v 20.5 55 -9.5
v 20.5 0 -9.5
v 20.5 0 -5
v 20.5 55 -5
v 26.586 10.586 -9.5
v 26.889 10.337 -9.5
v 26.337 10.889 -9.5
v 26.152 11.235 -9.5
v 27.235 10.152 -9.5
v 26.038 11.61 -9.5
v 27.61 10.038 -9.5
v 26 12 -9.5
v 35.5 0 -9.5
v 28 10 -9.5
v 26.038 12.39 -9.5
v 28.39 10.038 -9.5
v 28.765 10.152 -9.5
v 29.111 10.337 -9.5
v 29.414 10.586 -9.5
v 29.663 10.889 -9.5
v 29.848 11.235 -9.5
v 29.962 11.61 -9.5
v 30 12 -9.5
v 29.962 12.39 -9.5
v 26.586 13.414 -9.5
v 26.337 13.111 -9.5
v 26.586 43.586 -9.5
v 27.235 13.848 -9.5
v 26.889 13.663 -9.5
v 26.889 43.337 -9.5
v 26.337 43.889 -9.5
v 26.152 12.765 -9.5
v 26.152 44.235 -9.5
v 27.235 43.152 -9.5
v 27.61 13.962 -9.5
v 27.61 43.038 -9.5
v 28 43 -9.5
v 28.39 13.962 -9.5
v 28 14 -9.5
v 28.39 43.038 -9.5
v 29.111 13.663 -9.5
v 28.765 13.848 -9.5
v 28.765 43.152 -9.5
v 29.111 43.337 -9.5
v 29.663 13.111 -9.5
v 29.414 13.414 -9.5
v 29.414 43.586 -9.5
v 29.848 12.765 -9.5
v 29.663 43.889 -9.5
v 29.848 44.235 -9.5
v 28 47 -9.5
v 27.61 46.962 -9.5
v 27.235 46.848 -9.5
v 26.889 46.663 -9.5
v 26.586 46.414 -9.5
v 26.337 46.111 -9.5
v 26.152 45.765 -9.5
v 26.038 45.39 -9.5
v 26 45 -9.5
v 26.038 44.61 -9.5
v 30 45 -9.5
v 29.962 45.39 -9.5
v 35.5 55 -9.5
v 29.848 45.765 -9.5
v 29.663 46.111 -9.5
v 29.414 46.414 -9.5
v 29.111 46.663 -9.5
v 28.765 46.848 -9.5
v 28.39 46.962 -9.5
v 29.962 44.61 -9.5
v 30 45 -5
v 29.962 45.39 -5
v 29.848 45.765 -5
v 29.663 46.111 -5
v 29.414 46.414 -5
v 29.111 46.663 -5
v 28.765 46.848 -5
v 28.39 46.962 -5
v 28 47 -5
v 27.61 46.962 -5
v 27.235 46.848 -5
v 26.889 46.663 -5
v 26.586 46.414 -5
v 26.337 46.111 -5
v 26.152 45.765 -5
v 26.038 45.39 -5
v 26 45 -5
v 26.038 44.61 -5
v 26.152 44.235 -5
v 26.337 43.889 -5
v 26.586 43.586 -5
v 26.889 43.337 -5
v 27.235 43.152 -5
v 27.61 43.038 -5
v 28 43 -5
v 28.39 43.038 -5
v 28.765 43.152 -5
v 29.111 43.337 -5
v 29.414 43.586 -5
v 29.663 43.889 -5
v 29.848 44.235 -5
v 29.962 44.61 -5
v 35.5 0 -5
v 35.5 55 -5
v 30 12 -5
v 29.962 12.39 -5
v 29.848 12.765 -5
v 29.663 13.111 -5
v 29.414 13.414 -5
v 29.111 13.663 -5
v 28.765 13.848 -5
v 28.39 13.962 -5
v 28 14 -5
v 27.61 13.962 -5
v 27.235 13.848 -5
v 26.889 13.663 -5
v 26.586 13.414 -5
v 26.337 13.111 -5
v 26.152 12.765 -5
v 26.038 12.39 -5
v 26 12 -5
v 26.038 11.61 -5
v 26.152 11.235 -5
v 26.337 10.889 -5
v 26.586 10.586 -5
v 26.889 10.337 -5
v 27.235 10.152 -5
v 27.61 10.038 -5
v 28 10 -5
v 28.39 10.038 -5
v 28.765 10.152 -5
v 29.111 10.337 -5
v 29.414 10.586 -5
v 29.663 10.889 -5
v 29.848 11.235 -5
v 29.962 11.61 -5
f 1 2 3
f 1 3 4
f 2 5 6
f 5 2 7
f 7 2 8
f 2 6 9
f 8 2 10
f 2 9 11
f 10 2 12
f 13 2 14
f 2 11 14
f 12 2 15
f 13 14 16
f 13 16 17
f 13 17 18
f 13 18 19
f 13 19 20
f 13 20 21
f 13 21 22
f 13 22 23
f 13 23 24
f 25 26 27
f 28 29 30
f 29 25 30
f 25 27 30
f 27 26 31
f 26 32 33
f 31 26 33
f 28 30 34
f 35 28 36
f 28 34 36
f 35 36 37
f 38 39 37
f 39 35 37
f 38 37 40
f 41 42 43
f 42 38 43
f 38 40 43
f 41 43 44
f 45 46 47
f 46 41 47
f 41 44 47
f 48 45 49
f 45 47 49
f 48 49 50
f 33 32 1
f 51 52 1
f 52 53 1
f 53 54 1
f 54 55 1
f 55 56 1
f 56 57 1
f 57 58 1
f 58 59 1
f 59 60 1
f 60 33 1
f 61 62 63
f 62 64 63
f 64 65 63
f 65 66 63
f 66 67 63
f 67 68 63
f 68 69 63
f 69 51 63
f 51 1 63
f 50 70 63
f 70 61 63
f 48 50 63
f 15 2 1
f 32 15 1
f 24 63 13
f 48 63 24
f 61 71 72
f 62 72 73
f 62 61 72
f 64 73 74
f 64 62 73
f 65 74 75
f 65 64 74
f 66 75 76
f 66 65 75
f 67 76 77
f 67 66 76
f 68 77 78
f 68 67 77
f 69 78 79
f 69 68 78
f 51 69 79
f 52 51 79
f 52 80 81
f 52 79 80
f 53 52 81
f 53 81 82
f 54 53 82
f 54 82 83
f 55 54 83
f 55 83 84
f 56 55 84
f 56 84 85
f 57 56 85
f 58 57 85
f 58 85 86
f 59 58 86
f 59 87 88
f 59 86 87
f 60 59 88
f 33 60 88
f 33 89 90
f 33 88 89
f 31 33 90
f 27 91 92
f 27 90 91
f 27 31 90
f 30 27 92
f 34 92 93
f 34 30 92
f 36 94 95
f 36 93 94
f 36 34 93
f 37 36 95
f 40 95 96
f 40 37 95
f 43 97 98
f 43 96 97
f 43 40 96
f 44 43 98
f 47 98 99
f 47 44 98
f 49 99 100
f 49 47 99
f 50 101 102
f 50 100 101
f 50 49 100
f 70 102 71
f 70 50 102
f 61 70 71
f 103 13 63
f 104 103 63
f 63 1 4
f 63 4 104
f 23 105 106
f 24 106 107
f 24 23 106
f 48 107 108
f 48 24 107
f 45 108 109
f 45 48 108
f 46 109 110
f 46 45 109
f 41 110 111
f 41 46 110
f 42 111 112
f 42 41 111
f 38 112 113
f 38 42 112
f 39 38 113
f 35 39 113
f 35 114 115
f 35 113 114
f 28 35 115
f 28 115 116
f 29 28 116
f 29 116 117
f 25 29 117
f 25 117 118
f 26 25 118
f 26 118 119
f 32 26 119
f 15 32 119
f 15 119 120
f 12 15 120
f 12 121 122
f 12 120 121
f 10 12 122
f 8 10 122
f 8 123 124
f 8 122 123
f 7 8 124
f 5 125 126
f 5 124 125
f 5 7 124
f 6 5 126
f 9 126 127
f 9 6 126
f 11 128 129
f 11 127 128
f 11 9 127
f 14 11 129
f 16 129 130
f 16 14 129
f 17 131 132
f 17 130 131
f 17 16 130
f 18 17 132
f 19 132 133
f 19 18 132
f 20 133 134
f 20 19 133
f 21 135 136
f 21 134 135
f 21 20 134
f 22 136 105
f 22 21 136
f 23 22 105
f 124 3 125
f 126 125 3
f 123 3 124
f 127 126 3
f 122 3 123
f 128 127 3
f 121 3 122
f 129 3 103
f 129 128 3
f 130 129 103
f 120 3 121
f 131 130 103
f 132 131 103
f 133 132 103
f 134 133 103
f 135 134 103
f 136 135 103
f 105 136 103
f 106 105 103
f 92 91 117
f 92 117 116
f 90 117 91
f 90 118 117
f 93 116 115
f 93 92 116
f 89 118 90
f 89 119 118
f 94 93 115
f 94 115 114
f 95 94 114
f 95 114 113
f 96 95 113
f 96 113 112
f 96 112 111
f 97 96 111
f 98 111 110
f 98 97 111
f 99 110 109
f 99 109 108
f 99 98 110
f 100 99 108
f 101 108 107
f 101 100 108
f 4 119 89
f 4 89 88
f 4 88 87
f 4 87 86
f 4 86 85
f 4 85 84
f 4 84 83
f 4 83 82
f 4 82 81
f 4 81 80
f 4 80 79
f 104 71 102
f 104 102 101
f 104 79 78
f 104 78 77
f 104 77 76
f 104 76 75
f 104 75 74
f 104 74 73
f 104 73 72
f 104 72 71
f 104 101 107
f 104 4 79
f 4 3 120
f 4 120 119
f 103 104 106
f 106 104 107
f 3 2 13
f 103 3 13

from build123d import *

# Parameters (mm, degrees)
CYLINDER012_R     = 4
CYLINDER012_DEPTH = 4
CYLINDER013_R     = 2
CYLINDER013_DEPTH = 11.5
CYLINDER010_R     = 4
CYLINDER010_DEPTH = 4
CYLINDER011_R     = 2
CYLINDER011_DEPTH = 11.5
BOX002_W          = 15
BOX002_H          = 55
BOX002_DEPTH      = 4.5


with BuildPart() as cylinder015:
    # Cylinder012 → Cylinder012 (new body)
    with BuildSketch(Plane.XY.offset(7.5)):
        Circle(CYLINDER012_R)
    extrude(amount=CYLINDER012_DEPTH)


with BuildPart() as bolt_hole4_distance:
    # Cylinder013 → Cylinder013 (new body)
    with BuildSketch(Plane.XY):
        Circle(CYLINDER013_R)
    extrude(amount=CYLINDER013_DEPTH)

    # Fusion006: union Cylinder015
    add(cylinder015.part)


with BuildPart() as bolt_hole4_distance_1:
    # Fusion006 placement: moved
    add(bolt_hole4_distance.part.moved(Location((28, 45, -9))))


with BuildPart() as cylinder014:
    # Cylinder010 → Cylinder010 (new body)
    with BuildSketch(Plane.XY.offset(7.5)):
        Circle(CYLINDER010_R)
    extrude(amount=CYLINDER010_DEPTH)


with BuildPart() as bolt_hole3_distance:
    # Cylinder011 → Cylinder011 (new body)
    with BuildSketch(Plane.XY):
        Circle(CYLINDER011_R)
    extrude(amount=CYLINDER011_DEPTH)

    # Fusion005: union Cylinder014
    add(cylinder014.part)


with BuildPart() as bolt_hole3_distance_1:
    # Fusion005 placement: moved
    add(bolt_hole3_distance.part.moved(Location((28, 12, -9))))


with BuildPart() as z_distance:
    # Box002 → Box002 (new body)
    with BuildSketch(Plane(origin=(20.5, 0, -9), x_dir=(1, 0, 0), z_dir=(0, 0, 1))):
        with Locations((7.5, 27.5)):
            Rectangle(BOX002_W, BOX002_H)
    extrude(amount=BOX002_DEPTH)

    # Cut012: cut bolt-hole3-distance
    add(bolt_hole3_distance_1.part, mode=Mode.SUBTRACT)

    # Cut013: cut bolt-hole4-distance
    add(bolt_hole4_distance_1.part, mode=Mode.SUBTRACT)


with BuildPart() as z_distance_1:
    # Cut013 placement: moved
    add(z_distance.part.moved(Location((0, 0, -0.5))))


solid = z_distance_1.part
